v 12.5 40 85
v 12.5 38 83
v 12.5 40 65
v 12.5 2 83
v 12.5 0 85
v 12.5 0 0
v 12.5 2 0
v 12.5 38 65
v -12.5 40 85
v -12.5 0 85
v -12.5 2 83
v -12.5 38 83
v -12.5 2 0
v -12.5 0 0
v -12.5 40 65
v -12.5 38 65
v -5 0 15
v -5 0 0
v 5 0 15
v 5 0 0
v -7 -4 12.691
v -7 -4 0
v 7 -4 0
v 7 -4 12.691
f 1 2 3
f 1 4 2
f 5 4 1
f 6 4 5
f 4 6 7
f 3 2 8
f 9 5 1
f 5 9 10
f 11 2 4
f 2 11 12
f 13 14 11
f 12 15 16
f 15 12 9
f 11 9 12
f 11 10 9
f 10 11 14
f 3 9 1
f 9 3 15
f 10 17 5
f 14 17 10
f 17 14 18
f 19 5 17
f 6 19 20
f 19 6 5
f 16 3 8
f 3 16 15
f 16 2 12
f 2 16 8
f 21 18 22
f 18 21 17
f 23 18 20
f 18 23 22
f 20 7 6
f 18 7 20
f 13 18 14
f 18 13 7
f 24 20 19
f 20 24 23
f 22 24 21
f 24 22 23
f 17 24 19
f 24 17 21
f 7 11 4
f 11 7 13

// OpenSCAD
// file: config.scad
// Cupholder Configuration
// All dimensions in millimeters

// Cup holder dimensions
cup_diameter = 70;           // Inner diameter of the band
cup_holder_height = 20;      // Height of the holder band (2cm)
cup_wall_thickness = 1.2;    // Wall thickness of the band

// Base lobe settings
lobe_length = 35;            // How far the lobe extends toward ring center
lobe_width = 40;             // Width of the lobe at its widest

// Vertical post settings (connects mounting block to lobe)
post_height = 40;            // Height of vertical post
post_thickness = 2;          // Thickness of vertical post

// Hook dimensions
hook_total_length = 95;      // Total vertical length from ring bottom to hook top
hook_arm_height = 65;        // Height of just the vertical arm above the ring
hook_tip_length = 40;        // Horizontal length of the hook tip
hook_tip_depth = 20;         // Vertical depth of the hook tip (how far it curls down)
hook_width = 25;             // Width of the hook arm
hook_thickness = 2;          // Thickness of the hook arm

// Dovetail joint parameters
dovetail_width_base = 10;    // Width at narrow end (top)
dovetail_width_top = 14;     // Width at wide end (bottom)
dovetail_height = 15;        // Height of dovetail (1.5cm)
dovetail_depth = 4;          // Depth of dovetail protrusion
dovetail_tolerance = 0.3;    // Gap for fit

// Calculated values
mounting_block_thickness = max(post_thickness, cup_wall_thickness) + dovetail_depth;

// Rendering quality
$fn = 80;
// main file
// Hook Part
// Flat arm with L-shaped tip and dovetail protrusion

include <config.scad>

// Main hook module
module hook() {
    union() {
        // Vertical arm
        vertical_arm();

        // L-shaped hook tip
        hook_tip();

        // Dovetail protrusion at the bottom
        dovetail_protrusion();
    }
}

// Vertical arm
module vertical_arm() {
    total_height = hook_arm_height + cup_holder_height;

    translate([-hook_width/2, 0, 0])
    cube([hook_width, hook_thickness, total_height]);
}

// L-shaped hook tip
module hook_tip() {
    total_height = hook_arm_height + cup_holder_height;

    // Horizontal part
    translate([-hook_width/2, 0, total_height - hook_thickness])
    cube([hook_width, hook_tip_length, hook_thickness]);

    // Downward lip
    translate([-hook_width/2, hook_tip_length - hook_thickness, total_height - hook_tip_depth])
    cube([hook_width, hook_thickness, hook_tip_depth]);
}

// Dovetail protrusion (male) - slides up into mounting block slot
module dovetail_protrusion() {
    // Position at bottom of hook arm, on the OUTSIDE face (same side as hook tip)
    translate([0, 0, 0])
    rotate([0, 0, 180])  // Rotate to face outward (away from hook curve)
    dovetail_positive();
}

// Dovetail positive shape
module dovetail_positive() {
    // Dovetail profile - wider at bottom, narrower at top
    // This slides up into the slot on the mounting block
    difference() {
        linear_extrude(height = dovetail_height)
        polygon(points = [
            [-dovetail_width_base/2, 0],
            [-dovetail_width_top/2, dovetail_depth],
            [dovetail_width_top/2, dovetail_depth],
            [dovetail_width_base/2, 0]
        ]);

        // Chamfer at top outer edge - 30° from horizontal for printability
        // When printed upside down, this reduces overhang to ~50% overlap
        // Pivot at inner edge, rotate so outer edge dips down
        translate([0, 0, dovetail_height])
        rotate([-30, 0, 0])
        translate([-(dovetail_width_top + 2)/2, 0, 0])
        cube([dovetail_width_top + 2, dovetail_depth * 2, dovetail_height]);
    }
}

// Render the hook
hook();
